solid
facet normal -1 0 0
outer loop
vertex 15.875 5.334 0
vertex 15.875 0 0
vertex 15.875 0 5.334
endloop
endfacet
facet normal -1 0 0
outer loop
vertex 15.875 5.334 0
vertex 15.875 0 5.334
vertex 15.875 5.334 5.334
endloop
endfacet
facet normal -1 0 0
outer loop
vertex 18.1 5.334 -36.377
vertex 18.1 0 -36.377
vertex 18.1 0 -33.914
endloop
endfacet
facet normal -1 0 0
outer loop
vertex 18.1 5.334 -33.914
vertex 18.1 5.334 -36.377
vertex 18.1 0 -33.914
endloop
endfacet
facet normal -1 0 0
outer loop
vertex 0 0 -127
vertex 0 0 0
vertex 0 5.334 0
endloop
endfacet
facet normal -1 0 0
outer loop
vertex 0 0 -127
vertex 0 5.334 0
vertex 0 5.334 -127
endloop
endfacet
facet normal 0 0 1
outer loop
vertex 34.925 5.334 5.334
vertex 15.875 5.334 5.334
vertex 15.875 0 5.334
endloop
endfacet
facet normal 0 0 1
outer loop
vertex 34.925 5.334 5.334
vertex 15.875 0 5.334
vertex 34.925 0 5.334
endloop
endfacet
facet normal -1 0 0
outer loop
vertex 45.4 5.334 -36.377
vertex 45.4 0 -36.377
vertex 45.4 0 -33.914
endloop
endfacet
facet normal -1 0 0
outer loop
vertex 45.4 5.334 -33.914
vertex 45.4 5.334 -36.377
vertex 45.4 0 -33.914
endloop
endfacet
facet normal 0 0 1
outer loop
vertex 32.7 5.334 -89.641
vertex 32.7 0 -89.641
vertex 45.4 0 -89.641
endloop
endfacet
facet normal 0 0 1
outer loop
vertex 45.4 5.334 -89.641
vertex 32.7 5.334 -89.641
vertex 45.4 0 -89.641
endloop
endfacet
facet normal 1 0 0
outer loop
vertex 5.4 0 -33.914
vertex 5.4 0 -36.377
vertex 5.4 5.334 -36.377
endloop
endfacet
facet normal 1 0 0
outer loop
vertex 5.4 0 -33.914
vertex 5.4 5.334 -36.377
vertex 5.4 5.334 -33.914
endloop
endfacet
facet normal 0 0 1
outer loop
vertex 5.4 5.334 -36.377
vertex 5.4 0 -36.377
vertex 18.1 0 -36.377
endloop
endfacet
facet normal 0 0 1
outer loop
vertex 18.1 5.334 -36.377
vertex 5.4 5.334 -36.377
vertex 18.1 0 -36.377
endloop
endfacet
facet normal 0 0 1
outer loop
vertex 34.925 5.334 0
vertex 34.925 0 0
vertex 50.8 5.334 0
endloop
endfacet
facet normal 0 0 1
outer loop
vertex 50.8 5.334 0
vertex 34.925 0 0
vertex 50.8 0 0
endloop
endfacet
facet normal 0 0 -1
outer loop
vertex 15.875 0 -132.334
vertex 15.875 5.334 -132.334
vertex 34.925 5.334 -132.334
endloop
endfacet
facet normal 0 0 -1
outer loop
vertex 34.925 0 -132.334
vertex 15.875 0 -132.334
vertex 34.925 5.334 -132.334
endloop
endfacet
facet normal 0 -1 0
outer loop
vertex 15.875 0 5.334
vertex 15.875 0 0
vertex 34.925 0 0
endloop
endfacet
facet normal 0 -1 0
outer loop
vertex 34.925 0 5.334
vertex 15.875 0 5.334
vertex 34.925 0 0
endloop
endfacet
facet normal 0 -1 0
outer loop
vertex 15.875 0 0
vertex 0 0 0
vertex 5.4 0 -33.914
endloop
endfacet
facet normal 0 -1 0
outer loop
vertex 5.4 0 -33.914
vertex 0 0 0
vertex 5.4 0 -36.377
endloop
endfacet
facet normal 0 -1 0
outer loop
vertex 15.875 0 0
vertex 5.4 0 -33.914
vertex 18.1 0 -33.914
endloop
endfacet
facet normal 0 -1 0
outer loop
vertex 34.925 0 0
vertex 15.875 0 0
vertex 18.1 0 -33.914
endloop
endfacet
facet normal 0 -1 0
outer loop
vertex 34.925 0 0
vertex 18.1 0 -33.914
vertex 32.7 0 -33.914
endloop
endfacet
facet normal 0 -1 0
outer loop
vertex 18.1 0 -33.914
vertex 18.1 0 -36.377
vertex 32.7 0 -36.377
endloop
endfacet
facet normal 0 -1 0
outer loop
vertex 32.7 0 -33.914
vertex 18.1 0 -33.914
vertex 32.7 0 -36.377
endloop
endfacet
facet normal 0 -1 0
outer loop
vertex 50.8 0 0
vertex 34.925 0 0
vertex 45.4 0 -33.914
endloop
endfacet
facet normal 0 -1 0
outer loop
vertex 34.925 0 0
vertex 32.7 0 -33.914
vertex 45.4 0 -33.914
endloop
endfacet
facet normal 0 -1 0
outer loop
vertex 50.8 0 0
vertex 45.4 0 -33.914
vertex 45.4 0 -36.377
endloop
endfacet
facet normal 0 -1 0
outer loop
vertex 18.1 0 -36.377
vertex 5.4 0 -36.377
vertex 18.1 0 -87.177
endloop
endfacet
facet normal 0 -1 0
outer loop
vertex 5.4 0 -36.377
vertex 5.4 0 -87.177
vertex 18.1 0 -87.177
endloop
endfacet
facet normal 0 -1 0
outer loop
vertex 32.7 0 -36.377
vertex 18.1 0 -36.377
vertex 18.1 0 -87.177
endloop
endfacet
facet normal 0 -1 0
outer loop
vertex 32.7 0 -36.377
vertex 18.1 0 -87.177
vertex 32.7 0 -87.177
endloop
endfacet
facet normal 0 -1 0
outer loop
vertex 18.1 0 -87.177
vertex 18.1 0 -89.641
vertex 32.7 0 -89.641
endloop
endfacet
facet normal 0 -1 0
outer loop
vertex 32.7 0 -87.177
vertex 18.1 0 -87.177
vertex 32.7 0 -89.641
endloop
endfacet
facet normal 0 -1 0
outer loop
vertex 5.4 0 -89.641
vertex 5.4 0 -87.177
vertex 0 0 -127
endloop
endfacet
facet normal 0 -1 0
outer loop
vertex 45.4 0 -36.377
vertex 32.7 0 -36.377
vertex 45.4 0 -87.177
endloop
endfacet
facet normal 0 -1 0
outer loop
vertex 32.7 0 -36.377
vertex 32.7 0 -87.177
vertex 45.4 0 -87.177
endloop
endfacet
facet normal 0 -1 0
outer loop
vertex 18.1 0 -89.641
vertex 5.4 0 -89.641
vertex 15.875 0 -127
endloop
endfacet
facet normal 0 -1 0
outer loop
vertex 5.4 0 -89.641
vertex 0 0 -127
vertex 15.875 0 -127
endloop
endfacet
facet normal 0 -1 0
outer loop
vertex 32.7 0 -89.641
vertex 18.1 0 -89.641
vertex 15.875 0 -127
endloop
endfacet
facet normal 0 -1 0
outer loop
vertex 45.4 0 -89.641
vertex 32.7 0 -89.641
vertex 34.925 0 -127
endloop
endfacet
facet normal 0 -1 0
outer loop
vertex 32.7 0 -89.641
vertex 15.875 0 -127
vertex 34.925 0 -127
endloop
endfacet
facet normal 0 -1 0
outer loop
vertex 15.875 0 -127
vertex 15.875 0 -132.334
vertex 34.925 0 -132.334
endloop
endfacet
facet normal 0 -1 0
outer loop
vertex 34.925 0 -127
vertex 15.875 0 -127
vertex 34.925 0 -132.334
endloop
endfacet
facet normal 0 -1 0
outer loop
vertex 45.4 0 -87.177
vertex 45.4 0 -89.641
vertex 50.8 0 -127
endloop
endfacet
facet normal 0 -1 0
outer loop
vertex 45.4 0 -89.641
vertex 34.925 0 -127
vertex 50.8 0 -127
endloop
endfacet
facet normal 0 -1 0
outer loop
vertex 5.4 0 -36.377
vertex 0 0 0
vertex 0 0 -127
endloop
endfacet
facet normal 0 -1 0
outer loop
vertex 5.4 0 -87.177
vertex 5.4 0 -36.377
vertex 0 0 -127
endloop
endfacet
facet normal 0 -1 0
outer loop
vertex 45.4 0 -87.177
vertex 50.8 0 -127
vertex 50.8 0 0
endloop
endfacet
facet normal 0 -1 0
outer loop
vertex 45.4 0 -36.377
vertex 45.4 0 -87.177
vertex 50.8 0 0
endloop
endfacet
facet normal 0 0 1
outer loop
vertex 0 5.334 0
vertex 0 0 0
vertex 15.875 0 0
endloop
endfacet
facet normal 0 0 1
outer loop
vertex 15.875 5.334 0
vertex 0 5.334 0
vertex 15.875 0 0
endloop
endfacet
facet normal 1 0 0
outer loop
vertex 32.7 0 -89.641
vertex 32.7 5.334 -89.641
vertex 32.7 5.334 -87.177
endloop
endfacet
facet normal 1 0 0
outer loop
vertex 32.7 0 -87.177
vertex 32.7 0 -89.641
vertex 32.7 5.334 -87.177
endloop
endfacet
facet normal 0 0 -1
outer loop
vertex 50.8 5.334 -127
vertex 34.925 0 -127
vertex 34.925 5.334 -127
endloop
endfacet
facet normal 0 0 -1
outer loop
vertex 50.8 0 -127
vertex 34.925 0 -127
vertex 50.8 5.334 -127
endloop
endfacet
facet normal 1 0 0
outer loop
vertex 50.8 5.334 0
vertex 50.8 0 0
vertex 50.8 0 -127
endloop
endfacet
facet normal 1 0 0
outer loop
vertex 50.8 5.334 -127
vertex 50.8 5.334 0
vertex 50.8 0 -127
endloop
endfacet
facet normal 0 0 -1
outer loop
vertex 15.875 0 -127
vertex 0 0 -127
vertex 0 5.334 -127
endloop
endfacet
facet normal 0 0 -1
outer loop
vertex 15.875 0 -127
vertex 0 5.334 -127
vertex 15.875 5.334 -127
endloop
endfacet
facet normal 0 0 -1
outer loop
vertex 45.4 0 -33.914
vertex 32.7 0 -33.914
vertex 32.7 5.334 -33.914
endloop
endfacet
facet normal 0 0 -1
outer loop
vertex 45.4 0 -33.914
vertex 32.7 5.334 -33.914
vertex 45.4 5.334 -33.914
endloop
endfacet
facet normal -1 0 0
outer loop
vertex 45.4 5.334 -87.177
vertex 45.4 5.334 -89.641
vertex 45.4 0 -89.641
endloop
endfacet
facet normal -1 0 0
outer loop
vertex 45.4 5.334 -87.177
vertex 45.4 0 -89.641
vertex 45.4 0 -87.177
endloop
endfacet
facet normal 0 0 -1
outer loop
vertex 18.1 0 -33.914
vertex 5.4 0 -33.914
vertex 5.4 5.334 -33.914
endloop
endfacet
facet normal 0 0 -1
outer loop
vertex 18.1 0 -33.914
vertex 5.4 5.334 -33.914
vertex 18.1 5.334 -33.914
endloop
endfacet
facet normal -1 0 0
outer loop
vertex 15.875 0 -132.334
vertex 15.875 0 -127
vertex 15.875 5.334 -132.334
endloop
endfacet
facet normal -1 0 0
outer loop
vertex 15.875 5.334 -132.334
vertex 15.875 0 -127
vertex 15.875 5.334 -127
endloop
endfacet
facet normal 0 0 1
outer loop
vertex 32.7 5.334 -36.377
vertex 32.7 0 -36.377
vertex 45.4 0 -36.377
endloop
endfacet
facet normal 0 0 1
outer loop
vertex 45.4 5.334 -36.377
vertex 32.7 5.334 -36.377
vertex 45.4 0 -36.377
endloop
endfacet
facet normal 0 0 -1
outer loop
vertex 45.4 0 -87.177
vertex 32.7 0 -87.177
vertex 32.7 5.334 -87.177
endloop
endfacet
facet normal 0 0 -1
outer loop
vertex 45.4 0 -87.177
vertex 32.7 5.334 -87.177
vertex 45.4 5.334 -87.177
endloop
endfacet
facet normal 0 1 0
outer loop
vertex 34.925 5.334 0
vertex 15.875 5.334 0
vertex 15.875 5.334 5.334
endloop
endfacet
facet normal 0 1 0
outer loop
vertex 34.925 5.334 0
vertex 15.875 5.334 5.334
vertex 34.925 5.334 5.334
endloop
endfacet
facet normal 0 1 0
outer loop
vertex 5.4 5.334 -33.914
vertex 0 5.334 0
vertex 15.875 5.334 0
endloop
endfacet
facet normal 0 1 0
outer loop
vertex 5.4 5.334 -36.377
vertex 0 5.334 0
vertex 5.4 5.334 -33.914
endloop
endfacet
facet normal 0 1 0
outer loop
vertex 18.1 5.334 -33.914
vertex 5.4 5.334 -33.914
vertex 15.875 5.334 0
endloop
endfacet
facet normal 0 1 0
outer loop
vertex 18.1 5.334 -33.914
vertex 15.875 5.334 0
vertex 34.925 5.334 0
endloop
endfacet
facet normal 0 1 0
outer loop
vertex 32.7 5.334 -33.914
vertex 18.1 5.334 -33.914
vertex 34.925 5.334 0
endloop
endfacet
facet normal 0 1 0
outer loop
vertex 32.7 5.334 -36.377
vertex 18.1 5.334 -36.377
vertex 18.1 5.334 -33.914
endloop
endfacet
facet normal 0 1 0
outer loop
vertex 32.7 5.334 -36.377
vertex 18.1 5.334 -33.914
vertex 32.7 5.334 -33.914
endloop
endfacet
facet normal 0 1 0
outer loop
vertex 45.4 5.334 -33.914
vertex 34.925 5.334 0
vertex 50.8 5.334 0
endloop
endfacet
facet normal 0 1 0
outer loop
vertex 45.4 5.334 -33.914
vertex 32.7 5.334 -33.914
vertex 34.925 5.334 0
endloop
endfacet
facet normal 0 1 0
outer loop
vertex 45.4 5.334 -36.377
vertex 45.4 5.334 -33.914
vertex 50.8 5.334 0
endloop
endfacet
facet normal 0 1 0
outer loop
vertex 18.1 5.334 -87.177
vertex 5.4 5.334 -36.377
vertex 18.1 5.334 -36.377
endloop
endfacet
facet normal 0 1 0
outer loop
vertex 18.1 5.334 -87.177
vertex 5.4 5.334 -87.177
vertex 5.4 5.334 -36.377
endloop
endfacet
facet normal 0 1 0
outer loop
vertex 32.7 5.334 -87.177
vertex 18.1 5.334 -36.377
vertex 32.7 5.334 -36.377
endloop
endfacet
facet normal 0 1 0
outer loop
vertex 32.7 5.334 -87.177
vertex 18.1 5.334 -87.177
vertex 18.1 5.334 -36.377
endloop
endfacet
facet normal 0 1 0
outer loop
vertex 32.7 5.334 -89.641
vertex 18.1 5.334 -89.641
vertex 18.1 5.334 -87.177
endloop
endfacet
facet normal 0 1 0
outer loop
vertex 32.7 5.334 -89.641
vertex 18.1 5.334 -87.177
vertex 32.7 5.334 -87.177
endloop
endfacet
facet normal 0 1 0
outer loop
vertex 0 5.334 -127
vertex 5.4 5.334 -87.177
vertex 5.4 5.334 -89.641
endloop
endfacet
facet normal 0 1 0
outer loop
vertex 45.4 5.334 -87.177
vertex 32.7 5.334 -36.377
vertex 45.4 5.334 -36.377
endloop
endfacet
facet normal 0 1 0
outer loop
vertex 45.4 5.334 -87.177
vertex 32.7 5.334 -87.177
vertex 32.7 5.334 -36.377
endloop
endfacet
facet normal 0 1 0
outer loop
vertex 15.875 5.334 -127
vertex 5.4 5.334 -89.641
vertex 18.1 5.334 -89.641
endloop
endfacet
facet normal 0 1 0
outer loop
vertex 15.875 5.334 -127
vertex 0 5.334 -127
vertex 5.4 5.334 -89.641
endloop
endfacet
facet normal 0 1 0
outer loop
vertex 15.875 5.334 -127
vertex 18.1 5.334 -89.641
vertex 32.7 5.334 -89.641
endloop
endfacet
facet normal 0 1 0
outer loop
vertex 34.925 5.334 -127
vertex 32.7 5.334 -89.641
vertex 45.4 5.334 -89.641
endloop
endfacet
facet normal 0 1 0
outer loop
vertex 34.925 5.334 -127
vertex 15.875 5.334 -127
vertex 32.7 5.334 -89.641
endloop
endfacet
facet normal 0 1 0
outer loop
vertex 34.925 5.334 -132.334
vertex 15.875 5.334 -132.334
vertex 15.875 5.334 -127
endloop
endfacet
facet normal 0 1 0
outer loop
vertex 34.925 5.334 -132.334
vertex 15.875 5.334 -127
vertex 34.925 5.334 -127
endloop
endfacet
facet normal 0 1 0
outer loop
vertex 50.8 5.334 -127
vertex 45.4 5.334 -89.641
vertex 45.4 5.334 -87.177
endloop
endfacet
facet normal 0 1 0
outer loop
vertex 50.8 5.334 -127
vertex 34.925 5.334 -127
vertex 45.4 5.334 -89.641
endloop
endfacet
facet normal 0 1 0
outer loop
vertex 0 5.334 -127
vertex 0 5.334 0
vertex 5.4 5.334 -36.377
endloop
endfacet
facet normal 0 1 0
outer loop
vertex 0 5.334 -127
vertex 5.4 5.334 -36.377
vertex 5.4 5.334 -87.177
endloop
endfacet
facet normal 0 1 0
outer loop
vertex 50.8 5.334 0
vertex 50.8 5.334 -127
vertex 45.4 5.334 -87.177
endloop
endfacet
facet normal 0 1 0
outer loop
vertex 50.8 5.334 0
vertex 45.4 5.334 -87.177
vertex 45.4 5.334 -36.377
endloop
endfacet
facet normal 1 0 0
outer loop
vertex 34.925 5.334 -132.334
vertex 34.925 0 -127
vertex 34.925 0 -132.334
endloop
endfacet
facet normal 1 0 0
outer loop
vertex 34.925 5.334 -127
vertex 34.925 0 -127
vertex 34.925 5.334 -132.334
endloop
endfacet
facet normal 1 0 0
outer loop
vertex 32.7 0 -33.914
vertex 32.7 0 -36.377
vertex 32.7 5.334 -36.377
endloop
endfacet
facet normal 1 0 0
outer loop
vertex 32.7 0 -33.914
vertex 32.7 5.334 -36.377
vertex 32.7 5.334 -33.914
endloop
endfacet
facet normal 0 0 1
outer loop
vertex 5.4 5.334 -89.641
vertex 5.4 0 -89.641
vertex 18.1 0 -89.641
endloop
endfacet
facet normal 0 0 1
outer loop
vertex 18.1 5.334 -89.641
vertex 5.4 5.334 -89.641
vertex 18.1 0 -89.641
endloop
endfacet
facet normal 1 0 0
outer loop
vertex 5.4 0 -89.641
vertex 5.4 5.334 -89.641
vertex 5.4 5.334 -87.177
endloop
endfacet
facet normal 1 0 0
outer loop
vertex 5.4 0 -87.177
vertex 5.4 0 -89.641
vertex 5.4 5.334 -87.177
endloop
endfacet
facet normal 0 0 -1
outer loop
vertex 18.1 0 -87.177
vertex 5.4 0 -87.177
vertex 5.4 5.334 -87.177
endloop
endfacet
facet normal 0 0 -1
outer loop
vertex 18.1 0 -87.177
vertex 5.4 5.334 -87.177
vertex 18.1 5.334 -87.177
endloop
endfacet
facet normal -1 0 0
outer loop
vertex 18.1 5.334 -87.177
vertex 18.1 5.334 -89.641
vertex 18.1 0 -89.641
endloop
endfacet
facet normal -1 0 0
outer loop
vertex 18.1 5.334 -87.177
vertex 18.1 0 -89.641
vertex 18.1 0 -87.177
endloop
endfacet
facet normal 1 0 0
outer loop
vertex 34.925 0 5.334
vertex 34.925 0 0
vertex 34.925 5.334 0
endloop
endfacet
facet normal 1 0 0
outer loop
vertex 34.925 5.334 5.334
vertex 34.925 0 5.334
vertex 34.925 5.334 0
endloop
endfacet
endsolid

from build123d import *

# Parameters (mm, degrees)
SKETCH2_W          = 50.8
SKETCH2_H          = 127
BASE_DEPTH         = 5.334
SKETCH3_W          = 19.05
SKETCH3_H          = 5.334
TABS_DEPTH         = 5.334
SKETCH4_W          = 12.7
SKETCH4_H          = 2.4638
MOUNT_POINTS_DEPTH = 142.849847064


with BuildPart() as part:
    # Sketch2 → Base (new body)
    with BuildSketch(Plane(origin=(0, 0, 0), x_dir=(1, 0, 0), z_dir=(0, 1, 0))):
        with Locations((25.4, 63.5)):
            Rectangle(SKETCH2_W, SKETCH2_H)
    extrude(amount=BASE_DEPTH)

    # Sketch3 → Tabs (add)
    with BuildSketch(Plane.XY):
        with Locations((25.4, 2.667)):
            Rectangle(SKETCH3_W, SKETCH3_H)
    tabs = extrude(amount=TABS_DEPTH)

    # Tabs Mirror: Tabs across plane
    add(tabs.mirror(Plane.XY.offset(-63.5)))

    # Sketch4 → Mount Points (cut, through all)
    with BuildSketch(Plane.XZ):
        with Locations((11.75, -35.145453499)):
            Rectangle(SKETCH4_W, SKETCH4_H)
        with Locations((39.05, -35.145453499)):
            Rectangle(SKETCH4_W, SKETCH4_H)
        with Locations((11.75, -88.409253499)):
            Rectangle(SKETCH4_W, SKETCH4_H)
        with Locations((39.05, -88.409253499)):
            Rectangle(SKETCH4_W, SKETCH4_H)
    extrude(amount=-MOUNT_POINTS_DEPTH, mode=Mode.SUBTRACT)


solid = part.part
